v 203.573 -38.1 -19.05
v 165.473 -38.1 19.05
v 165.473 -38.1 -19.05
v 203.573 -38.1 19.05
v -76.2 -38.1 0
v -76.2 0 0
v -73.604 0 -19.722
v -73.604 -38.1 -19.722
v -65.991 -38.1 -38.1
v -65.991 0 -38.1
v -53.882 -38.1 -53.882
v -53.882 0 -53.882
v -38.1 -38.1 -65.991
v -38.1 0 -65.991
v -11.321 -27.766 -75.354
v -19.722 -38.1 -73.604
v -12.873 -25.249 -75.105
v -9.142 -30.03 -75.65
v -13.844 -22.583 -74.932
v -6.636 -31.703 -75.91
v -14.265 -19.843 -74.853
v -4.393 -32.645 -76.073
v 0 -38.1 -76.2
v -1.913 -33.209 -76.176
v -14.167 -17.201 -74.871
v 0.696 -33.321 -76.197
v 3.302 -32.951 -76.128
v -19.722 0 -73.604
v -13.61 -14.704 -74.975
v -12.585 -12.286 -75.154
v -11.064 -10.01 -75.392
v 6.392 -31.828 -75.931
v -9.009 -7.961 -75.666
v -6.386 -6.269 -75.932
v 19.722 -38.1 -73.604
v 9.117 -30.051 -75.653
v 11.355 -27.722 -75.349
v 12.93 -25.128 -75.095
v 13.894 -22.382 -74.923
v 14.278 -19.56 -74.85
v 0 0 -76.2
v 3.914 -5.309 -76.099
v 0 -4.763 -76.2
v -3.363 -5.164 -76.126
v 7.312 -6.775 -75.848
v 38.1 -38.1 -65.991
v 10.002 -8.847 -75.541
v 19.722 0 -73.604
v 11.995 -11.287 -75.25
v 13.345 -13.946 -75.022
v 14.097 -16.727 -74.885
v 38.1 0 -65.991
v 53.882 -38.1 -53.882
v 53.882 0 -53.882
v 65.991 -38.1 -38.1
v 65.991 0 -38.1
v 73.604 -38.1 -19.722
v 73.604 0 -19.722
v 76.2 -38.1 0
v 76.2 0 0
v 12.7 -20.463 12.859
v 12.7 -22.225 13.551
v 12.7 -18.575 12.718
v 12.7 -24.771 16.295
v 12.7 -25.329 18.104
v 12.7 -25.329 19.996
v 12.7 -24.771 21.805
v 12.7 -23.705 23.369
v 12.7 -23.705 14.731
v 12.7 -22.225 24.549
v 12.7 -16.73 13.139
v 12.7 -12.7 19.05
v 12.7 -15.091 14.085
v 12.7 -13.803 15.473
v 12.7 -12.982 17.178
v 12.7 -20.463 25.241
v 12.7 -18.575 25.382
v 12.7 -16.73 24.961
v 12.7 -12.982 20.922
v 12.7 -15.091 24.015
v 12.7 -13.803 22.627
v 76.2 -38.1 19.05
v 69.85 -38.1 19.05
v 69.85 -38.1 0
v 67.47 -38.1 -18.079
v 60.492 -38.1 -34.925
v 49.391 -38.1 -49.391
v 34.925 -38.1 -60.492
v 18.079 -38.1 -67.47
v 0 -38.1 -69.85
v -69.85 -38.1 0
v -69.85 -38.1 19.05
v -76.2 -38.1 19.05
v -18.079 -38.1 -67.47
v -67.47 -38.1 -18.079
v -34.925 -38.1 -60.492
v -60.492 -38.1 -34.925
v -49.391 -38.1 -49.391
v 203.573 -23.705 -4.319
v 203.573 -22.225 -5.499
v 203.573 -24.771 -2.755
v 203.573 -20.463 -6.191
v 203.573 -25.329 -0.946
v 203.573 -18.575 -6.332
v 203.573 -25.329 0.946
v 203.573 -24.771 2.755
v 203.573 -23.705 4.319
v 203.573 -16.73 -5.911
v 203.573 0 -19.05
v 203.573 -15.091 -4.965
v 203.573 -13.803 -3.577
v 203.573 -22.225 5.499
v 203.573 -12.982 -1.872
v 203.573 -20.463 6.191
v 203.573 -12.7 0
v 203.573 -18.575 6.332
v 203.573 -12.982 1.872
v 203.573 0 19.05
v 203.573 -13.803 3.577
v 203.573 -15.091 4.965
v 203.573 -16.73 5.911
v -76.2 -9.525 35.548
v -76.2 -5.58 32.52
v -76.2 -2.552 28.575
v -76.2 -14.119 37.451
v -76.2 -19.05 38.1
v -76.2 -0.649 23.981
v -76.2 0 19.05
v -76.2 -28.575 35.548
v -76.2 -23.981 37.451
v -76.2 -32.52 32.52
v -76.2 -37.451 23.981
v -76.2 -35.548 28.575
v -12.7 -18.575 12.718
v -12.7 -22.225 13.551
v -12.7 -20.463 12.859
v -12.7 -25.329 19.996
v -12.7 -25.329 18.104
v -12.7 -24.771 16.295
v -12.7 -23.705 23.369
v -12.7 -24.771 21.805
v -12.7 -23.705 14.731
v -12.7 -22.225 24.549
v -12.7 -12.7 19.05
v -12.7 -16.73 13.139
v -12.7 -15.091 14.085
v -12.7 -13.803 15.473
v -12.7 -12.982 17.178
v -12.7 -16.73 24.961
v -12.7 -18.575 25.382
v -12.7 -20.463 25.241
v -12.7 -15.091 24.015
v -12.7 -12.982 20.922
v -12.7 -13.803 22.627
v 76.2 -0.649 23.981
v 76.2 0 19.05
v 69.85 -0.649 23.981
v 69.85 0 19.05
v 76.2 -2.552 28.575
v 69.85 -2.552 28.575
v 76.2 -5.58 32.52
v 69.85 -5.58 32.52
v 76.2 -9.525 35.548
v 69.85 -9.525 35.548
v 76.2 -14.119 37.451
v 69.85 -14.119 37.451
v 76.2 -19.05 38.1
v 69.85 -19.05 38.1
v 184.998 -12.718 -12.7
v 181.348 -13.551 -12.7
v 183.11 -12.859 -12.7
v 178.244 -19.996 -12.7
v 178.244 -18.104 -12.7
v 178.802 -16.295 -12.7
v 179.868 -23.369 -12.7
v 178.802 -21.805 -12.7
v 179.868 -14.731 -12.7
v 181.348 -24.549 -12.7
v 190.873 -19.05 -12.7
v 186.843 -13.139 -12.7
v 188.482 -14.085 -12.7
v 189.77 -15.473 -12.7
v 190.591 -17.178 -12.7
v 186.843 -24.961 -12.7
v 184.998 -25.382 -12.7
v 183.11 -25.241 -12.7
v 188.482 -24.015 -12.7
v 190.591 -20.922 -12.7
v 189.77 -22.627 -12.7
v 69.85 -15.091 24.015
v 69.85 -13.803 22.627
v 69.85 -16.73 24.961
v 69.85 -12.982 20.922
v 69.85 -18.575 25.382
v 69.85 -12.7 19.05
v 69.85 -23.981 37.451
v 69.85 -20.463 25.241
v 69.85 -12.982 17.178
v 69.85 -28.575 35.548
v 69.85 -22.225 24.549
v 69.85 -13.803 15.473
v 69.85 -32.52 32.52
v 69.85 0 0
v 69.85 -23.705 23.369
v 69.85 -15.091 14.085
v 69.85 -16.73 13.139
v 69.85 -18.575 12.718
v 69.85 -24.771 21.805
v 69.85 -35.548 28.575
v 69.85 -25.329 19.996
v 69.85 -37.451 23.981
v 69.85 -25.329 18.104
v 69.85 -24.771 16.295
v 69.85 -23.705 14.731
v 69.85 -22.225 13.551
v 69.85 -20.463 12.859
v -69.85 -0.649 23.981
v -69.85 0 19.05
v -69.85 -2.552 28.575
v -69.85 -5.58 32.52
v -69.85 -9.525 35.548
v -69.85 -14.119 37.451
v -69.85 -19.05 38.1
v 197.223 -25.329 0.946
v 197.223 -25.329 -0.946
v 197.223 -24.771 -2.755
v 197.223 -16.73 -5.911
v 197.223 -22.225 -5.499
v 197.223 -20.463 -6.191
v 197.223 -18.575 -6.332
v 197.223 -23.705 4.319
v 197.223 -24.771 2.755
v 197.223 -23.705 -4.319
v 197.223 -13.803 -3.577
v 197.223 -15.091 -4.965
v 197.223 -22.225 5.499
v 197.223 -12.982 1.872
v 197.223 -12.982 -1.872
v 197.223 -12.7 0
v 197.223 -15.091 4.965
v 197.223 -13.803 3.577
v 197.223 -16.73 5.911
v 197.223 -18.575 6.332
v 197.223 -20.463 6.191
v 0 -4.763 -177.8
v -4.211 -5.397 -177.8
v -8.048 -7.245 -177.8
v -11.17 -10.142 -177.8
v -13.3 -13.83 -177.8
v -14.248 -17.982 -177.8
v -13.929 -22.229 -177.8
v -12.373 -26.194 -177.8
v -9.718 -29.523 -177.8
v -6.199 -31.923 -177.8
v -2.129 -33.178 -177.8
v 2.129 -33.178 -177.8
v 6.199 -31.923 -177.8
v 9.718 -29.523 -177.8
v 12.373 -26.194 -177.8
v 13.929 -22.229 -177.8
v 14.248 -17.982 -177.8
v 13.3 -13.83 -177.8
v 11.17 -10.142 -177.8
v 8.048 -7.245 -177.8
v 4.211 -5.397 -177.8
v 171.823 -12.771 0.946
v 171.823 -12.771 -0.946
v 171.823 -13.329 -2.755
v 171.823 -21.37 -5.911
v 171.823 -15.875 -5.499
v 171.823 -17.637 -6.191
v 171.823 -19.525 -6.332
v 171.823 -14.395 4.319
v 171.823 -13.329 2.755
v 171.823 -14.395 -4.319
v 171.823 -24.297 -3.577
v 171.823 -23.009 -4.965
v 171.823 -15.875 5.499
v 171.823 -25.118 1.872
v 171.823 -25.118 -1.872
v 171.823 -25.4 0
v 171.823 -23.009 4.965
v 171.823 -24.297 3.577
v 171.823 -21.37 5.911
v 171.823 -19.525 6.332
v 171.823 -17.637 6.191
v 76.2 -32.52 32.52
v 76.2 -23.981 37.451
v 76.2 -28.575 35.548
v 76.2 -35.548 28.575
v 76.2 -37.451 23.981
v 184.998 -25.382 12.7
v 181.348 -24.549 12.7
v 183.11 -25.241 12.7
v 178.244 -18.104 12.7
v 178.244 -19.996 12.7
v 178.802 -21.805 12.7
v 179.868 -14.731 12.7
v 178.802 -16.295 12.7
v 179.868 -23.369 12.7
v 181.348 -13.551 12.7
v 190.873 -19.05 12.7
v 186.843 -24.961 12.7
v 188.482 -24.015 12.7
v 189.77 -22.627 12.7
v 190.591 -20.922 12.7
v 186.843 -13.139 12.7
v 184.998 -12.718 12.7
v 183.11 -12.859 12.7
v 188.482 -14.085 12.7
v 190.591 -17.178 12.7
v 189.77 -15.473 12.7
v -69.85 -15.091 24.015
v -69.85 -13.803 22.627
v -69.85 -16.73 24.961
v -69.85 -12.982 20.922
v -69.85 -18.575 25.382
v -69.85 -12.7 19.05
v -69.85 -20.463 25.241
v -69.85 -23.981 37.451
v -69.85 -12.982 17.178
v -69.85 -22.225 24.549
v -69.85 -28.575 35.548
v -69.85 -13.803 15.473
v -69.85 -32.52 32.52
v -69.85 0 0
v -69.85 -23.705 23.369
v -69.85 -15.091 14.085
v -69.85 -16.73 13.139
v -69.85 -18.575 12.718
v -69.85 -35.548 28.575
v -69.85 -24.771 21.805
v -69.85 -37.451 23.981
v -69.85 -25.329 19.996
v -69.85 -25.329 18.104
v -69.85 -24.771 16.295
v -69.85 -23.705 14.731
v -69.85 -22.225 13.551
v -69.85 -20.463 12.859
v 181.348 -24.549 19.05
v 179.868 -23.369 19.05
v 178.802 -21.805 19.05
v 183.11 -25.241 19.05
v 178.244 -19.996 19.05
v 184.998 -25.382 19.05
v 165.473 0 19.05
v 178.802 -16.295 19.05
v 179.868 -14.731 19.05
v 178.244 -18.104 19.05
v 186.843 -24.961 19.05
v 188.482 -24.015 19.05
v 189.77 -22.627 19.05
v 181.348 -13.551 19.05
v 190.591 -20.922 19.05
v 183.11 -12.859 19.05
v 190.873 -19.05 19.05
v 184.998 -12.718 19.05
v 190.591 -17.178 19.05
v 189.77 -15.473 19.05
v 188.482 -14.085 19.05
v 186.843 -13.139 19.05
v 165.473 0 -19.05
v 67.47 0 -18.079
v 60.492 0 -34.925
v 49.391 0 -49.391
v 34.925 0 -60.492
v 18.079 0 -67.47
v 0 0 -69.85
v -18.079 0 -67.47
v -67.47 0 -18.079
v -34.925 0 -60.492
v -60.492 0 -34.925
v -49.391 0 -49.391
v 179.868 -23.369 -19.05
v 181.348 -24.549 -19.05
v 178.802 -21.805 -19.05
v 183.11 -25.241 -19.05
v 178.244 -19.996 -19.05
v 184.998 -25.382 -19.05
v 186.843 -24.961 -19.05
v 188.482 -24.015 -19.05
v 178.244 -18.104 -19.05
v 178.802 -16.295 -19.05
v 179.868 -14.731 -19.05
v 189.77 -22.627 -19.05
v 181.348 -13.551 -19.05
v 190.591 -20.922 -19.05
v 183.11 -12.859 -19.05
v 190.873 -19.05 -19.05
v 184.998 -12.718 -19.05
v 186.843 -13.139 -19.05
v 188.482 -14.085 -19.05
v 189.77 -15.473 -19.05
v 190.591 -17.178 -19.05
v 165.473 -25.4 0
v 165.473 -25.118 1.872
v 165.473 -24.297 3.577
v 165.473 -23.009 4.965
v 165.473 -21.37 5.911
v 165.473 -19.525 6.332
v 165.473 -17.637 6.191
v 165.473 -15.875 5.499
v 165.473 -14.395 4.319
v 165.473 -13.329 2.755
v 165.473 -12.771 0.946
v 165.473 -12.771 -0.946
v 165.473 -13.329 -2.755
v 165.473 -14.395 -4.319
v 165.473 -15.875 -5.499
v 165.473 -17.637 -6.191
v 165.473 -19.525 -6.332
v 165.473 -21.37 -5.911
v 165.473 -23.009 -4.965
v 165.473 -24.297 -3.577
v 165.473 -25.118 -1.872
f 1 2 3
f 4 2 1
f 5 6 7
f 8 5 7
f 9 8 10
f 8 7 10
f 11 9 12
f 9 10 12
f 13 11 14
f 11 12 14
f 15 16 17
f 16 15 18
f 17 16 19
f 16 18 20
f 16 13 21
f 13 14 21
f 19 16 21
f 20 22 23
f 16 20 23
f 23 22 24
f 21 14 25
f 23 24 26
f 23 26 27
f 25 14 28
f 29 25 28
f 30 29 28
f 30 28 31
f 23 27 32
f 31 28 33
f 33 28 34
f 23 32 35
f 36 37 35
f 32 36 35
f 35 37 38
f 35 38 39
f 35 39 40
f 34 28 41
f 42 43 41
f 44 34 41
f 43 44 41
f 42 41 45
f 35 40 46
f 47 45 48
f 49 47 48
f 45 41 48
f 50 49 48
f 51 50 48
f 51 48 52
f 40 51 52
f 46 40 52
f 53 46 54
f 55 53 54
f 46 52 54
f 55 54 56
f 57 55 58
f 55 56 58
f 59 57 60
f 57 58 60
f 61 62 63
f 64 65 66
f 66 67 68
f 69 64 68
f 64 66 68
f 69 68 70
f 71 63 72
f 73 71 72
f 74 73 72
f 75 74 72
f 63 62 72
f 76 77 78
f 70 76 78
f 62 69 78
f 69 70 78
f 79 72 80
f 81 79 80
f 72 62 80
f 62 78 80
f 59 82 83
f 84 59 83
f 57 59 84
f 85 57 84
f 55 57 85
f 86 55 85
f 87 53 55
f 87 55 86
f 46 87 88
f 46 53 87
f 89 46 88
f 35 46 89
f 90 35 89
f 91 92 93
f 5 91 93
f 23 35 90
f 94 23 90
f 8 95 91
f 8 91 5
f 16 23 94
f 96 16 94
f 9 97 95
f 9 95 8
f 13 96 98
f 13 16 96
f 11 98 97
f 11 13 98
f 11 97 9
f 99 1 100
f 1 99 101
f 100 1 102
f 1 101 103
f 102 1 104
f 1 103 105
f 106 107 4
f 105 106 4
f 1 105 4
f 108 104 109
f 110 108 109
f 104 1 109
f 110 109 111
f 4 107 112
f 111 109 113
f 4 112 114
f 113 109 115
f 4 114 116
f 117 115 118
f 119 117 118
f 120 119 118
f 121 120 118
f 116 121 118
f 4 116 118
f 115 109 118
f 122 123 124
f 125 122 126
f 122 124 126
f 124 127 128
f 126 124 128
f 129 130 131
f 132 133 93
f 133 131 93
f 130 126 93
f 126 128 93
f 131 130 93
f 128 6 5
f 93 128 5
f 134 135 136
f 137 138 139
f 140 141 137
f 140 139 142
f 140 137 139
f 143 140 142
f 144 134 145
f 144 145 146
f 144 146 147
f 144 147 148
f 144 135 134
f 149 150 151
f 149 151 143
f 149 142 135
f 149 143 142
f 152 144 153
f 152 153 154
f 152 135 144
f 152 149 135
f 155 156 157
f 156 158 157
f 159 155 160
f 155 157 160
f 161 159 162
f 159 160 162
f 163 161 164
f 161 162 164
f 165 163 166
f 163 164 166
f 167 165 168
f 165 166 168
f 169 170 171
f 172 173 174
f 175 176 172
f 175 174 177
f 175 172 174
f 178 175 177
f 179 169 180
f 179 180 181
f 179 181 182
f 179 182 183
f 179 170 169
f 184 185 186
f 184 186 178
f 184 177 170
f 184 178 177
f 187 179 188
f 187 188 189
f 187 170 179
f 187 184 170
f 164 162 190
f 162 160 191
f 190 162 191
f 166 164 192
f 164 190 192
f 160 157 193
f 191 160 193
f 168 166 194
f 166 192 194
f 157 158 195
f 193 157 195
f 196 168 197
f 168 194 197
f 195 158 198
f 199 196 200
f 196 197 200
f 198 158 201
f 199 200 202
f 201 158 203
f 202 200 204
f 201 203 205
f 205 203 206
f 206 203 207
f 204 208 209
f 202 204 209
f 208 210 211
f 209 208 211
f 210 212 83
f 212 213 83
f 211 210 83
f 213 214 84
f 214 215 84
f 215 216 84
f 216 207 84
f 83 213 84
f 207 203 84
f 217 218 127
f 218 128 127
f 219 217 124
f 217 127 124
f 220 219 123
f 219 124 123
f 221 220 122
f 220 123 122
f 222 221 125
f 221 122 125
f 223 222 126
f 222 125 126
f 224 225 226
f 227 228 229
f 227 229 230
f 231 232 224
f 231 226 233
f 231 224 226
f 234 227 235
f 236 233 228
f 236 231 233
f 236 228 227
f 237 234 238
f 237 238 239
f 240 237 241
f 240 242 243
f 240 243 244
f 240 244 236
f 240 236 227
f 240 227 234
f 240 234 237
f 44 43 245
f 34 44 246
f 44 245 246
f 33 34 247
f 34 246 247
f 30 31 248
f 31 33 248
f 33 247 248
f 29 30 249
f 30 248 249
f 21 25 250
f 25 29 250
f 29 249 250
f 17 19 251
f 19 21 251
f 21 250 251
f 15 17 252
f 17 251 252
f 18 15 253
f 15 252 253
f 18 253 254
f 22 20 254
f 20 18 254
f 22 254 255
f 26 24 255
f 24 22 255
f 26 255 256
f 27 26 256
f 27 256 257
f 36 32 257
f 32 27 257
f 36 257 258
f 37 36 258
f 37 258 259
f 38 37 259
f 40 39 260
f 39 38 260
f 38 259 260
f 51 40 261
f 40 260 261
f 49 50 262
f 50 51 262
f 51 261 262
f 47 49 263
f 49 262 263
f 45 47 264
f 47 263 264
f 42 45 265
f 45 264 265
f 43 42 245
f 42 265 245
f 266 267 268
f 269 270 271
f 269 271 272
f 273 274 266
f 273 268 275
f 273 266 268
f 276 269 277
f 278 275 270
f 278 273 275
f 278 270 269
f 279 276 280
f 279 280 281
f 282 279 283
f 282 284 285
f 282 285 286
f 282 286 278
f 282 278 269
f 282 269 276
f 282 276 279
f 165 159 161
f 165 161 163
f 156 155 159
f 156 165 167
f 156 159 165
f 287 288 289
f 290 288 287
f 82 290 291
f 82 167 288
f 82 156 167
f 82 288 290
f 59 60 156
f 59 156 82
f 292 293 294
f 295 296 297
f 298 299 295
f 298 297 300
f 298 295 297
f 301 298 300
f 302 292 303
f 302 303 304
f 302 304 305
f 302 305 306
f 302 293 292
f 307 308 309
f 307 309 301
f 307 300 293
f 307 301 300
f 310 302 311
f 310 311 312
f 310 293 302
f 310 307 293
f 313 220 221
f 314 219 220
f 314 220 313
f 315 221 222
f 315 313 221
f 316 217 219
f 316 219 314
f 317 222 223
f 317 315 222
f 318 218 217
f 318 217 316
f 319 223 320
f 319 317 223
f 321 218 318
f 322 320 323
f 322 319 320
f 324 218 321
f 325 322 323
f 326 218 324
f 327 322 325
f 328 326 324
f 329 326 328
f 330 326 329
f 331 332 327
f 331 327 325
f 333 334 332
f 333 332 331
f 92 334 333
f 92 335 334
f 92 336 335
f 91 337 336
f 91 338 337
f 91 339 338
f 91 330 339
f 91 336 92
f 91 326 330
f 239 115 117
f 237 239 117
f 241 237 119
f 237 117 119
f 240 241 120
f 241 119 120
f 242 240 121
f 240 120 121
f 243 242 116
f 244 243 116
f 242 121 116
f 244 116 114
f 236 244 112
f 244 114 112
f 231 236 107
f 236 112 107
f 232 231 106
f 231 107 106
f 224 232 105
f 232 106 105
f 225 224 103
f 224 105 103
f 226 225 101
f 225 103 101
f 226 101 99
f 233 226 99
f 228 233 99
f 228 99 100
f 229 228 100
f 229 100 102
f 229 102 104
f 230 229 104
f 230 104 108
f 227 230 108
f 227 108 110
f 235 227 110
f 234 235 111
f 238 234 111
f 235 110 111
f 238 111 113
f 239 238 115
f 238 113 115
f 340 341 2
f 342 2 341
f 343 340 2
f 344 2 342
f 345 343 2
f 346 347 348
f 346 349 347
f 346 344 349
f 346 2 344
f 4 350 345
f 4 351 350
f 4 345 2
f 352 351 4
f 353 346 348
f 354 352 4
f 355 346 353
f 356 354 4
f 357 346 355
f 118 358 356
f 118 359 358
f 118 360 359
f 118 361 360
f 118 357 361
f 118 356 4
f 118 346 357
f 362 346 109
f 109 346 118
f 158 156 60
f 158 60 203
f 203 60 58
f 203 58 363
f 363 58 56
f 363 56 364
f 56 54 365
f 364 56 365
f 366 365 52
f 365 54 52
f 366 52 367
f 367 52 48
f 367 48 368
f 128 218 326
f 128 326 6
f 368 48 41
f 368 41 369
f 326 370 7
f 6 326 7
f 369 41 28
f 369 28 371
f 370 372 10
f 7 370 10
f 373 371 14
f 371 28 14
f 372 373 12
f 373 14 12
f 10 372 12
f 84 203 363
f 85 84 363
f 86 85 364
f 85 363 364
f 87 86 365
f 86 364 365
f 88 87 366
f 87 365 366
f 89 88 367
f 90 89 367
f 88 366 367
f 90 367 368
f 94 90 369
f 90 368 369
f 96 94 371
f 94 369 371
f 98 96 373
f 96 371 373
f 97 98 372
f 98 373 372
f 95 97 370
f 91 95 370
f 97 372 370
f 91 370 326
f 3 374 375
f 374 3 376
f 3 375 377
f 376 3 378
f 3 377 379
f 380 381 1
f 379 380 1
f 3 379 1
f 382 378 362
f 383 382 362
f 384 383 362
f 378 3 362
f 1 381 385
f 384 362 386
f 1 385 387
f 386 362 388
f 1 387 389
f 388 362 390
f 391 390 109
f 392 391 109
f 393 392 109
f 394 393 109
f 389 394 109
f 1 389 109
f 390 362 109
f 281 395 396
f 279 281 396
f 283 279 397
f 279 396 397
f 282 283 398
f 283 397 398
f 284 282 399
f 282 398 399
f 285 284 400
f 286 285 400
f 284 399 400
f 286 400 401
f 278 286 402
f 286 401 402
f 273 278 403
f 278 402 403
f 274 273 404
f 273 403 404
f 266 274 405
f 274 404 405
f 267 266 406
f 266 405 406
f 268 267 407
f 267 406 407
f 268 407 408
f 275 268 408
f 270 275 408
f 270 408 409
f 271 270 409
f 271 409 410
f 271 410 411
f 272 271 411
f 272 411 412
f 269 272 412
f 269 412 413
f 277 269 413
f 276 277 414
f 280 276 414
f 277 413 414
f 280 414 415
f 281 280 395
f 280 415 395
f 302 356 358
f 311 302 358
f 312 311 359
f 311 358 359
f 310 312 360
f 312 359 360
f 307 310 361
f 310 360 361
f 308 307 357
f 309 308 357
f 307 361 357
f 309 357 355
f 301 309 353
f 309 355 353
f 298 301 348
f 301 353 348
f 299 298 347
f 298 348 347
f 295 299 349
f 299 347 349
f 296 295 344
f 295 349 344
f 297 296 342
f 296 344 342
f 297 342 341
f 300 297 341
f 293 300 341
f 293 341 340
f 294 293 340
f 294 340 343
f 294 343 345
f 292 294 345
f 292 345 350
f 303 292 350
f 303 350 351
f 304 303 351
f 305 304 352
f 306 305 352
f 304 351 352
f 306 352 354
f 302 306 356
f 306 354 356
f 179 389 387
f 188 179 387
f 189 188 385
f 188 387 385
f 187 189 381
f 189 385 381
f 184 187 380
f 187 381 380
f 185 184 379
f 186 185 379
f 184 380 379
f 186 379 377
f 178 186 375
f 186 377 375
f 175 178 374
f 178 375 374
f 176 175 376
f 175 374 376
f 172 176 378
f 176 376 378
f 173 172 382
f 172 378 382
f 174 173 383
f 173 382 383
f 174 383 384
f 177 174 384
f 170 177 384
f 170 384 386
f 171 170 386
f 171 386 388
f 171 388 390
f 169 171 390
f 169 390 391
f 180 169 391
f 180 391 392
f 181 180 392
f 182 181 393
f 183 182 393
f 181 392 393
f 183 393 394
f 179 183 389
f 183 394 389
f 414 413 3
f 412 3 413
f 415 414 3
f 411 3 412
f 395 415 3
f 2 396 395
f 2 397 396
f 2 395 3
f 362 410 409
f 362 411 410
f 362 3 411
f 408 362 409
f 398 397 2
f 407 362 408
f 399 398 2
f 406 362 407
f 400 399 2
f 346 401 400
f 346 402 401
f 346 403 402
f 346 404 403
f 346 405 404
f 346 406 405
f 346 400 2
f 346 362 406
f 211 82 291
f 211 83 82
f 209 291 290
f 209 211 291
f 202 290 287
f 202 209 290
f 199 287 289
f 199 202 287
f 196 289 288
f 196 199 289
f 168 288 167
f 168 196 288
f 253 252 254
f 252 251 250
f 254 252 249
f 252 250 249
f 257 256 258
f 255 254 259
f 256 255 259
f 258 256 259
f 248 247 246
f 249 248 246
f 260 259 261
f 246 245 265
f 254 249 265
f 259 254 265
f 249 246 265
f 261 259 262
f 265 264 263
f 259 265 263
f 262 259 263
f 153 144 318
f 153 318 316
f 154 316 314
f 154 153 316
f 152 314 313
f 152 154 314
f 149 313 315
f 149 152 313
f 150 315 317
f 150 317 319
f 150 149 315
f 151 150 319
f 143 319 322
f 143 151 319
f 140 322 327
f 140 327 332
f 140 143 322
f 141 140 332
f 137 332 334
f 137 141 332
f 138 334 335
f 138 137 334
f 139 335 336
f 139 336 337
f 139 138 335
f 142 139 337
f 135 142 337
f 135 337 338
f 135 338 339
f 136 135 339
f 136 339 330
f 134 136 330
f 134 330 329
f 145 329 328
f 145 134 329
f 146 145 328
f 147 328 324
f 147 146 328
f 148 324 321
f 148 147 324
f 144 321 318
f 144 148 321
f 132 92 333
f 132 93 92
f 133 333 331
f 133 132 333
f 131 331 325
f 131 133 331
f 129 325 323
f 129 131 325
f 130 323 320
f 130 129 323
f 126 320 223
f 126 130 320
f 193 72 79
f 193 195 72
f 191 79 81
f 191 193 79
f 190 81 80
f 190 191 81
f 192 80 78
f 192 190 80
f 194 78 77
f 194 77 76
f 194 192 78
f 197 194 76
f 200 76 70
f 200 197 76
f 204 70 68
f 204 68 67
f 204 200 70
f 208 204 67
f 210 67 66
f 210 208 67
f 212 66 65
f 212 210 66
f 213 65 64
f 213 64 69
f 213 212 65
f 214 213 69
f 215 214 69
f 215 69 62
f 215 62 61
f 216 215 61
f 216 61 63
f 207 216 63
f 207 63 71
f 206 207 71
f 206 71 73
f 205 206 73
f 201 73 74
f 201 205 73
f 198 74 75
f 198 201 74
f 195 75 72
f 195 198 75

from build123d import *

# Parameters (mm, degrees)
F1_DEPTH  = 38.1
F2_DEPTH  = 38.1
F3_R      = 19.04999
F4_R      = 6.35
F5_DEPTH  = 69.85
F6_R      = 6.35
F7_DEPTH  = 12.7
F10_DEPTH = 115.6514373633
F11_DEPTH = 12.7
F12_W     = 38.1
F12_H     = 38.1
F13_DEPTH = 38.1
F14_R     = 6.35
F15_DEPTH = 6.35
F16_R     = 6.35
F17_DEPTH = 6.35
F18_R     = 6.35
F19_DEPTH = 6.35
F20_R     = 6.35
F21_DEPTH = 6.35


# Not quite as in the source:
# - a fillet or chamfer is up to 0.001 mm smaller than in the source, because OpenCascade refuses the exact size


with BuildPart() as f1:
    # F0 (on Front) → F1 (new body)
    with BuildSketch(Plane.XZ):
        with BuildLine():
            Line((-69.85, 0), (-76.2, 0))
            ThreePointArc((-76.2, 0), (0, -76.2), (76.2, 0))
            Line((76.2, 0), (69.85, 0))
            ThreePointArc((69.85, 0), (0, -69.85), (-69.85, 0))
        make_face()
    extrude(amount=F1_DEPTH)

    # F2 (add): faces of the model
    f2_faces = [f1.faces().sort_by_distance(p)[0] for p in [
        (73.025, -19.05, 0),
        (-73.025, -19.05, 0),
    ]]
    extrude(f2_faces, amount=F2_DEPTH)

    # F3 (radius 19.05 in the source; OpenCascade refuses exactly that, so slightly less here)
    f3_edges = [f1.edges().sort_by_distance(p)[0] for p in [
        (73.025, -38.1, 38.1),
        (73.025, 0, 38.1),
        (-73.025, 0, 38.1),
        (-73.025, -38.1, 38.1),
    ]]
    fillet(f3_edges, radius=F3_R)

    # F4 (on Right) → F5 (join, symmetric)
    with BuildSketch(Plane.YZ):
        with Locations((-19.05, 19.05)):
            Circle(F4_R)
    extrude(amount=F5_DEPTH, both=True)

    # F6 (on Right) → F7 (cut, symmetric)
    with BuildSketch(Plane.YZ):
        with Locations((-19.05, 19.05)):
            Circle(F6_R)
    extrude(amount=F7_DEPTH, both=True, mode=Mode.SUBTRACT)

    # F9 (on offset) → F10 (join, through all)
    with BuildSketch(Plane.XY.offset(-190.5)):
        with BuildLine():
            ThreePointArc((14.2875, -19.05), (10.1027881362, -8.9472118638), (0, -4.7625))
            ThreePointArc((0, -4.7625), (-10.1027881362, -29.1527881362), (14.2875, -19.05))
        make_face()
    extrude(amount=F10_DEPTH)

    # F11 (cut): a face of the model
    f11_faces = [f1.faces().sort_by_distance(p)[0] for p in [
        (0, -19.05, -190.5),
    ]]
    extrude(f11_faces, amount=-F11_DEPTH, mode=Mode.SUBTRACT)


with BuildPart() as f13:
    # F12 (on Front) → F13 (new body)
    with BuildSketch(Plane.XZ):
        with Locations((184.5231820917, 0)):
            Rectangle(F12_W, F12_H)
    extrude(amount=F13_DEPTH)

    # F14 (on face) → F15 (cut)
    with BuildSketch(Plane.YZ.offset(203.5731820917)):
        with Locations((-19.05, 0)):
            Circle(F14_R)
    extrude(amount=-F15_DEPTH, mode=Mode.SUBTRACT)

    # F16 (on face) → F17 (cut)
    with BuildSketch(Plane(origin=(165.4731820917, 0, 0), x_dir=(0, -1, 0), z_dir=(-1, 0, 0))):
        with Locations((19.05, 0)):
            Circle(F16_R)
    extrude(amount=-F17_DEPTH, mode=Mode.SUBTRACT)

    # F18 (on face) → F19 (cut)
    with BuildSketch(Plane.XY.offset(19.05)):
        with Locations((184.5231820917, -19.05)):
            Circle(F18_R)
    extrude(amount=-F19_DEPTH, mode=Mode.SUBTRACT)

    # F20 (on face) → F21 (cut)
    with BuildSketch(Plane(origin=(0, 0, -19.05), x_dir=(1, 0, 0), z_dir=(0, 0, -1))):
        with Locations((184.5231820917, 19.05)):
            Circle(F20_R)
    extrude(amount=-F21_DEPTH, mode=Mode.SUBTRACT)


solid = Compound([f1.part, f13.part])
